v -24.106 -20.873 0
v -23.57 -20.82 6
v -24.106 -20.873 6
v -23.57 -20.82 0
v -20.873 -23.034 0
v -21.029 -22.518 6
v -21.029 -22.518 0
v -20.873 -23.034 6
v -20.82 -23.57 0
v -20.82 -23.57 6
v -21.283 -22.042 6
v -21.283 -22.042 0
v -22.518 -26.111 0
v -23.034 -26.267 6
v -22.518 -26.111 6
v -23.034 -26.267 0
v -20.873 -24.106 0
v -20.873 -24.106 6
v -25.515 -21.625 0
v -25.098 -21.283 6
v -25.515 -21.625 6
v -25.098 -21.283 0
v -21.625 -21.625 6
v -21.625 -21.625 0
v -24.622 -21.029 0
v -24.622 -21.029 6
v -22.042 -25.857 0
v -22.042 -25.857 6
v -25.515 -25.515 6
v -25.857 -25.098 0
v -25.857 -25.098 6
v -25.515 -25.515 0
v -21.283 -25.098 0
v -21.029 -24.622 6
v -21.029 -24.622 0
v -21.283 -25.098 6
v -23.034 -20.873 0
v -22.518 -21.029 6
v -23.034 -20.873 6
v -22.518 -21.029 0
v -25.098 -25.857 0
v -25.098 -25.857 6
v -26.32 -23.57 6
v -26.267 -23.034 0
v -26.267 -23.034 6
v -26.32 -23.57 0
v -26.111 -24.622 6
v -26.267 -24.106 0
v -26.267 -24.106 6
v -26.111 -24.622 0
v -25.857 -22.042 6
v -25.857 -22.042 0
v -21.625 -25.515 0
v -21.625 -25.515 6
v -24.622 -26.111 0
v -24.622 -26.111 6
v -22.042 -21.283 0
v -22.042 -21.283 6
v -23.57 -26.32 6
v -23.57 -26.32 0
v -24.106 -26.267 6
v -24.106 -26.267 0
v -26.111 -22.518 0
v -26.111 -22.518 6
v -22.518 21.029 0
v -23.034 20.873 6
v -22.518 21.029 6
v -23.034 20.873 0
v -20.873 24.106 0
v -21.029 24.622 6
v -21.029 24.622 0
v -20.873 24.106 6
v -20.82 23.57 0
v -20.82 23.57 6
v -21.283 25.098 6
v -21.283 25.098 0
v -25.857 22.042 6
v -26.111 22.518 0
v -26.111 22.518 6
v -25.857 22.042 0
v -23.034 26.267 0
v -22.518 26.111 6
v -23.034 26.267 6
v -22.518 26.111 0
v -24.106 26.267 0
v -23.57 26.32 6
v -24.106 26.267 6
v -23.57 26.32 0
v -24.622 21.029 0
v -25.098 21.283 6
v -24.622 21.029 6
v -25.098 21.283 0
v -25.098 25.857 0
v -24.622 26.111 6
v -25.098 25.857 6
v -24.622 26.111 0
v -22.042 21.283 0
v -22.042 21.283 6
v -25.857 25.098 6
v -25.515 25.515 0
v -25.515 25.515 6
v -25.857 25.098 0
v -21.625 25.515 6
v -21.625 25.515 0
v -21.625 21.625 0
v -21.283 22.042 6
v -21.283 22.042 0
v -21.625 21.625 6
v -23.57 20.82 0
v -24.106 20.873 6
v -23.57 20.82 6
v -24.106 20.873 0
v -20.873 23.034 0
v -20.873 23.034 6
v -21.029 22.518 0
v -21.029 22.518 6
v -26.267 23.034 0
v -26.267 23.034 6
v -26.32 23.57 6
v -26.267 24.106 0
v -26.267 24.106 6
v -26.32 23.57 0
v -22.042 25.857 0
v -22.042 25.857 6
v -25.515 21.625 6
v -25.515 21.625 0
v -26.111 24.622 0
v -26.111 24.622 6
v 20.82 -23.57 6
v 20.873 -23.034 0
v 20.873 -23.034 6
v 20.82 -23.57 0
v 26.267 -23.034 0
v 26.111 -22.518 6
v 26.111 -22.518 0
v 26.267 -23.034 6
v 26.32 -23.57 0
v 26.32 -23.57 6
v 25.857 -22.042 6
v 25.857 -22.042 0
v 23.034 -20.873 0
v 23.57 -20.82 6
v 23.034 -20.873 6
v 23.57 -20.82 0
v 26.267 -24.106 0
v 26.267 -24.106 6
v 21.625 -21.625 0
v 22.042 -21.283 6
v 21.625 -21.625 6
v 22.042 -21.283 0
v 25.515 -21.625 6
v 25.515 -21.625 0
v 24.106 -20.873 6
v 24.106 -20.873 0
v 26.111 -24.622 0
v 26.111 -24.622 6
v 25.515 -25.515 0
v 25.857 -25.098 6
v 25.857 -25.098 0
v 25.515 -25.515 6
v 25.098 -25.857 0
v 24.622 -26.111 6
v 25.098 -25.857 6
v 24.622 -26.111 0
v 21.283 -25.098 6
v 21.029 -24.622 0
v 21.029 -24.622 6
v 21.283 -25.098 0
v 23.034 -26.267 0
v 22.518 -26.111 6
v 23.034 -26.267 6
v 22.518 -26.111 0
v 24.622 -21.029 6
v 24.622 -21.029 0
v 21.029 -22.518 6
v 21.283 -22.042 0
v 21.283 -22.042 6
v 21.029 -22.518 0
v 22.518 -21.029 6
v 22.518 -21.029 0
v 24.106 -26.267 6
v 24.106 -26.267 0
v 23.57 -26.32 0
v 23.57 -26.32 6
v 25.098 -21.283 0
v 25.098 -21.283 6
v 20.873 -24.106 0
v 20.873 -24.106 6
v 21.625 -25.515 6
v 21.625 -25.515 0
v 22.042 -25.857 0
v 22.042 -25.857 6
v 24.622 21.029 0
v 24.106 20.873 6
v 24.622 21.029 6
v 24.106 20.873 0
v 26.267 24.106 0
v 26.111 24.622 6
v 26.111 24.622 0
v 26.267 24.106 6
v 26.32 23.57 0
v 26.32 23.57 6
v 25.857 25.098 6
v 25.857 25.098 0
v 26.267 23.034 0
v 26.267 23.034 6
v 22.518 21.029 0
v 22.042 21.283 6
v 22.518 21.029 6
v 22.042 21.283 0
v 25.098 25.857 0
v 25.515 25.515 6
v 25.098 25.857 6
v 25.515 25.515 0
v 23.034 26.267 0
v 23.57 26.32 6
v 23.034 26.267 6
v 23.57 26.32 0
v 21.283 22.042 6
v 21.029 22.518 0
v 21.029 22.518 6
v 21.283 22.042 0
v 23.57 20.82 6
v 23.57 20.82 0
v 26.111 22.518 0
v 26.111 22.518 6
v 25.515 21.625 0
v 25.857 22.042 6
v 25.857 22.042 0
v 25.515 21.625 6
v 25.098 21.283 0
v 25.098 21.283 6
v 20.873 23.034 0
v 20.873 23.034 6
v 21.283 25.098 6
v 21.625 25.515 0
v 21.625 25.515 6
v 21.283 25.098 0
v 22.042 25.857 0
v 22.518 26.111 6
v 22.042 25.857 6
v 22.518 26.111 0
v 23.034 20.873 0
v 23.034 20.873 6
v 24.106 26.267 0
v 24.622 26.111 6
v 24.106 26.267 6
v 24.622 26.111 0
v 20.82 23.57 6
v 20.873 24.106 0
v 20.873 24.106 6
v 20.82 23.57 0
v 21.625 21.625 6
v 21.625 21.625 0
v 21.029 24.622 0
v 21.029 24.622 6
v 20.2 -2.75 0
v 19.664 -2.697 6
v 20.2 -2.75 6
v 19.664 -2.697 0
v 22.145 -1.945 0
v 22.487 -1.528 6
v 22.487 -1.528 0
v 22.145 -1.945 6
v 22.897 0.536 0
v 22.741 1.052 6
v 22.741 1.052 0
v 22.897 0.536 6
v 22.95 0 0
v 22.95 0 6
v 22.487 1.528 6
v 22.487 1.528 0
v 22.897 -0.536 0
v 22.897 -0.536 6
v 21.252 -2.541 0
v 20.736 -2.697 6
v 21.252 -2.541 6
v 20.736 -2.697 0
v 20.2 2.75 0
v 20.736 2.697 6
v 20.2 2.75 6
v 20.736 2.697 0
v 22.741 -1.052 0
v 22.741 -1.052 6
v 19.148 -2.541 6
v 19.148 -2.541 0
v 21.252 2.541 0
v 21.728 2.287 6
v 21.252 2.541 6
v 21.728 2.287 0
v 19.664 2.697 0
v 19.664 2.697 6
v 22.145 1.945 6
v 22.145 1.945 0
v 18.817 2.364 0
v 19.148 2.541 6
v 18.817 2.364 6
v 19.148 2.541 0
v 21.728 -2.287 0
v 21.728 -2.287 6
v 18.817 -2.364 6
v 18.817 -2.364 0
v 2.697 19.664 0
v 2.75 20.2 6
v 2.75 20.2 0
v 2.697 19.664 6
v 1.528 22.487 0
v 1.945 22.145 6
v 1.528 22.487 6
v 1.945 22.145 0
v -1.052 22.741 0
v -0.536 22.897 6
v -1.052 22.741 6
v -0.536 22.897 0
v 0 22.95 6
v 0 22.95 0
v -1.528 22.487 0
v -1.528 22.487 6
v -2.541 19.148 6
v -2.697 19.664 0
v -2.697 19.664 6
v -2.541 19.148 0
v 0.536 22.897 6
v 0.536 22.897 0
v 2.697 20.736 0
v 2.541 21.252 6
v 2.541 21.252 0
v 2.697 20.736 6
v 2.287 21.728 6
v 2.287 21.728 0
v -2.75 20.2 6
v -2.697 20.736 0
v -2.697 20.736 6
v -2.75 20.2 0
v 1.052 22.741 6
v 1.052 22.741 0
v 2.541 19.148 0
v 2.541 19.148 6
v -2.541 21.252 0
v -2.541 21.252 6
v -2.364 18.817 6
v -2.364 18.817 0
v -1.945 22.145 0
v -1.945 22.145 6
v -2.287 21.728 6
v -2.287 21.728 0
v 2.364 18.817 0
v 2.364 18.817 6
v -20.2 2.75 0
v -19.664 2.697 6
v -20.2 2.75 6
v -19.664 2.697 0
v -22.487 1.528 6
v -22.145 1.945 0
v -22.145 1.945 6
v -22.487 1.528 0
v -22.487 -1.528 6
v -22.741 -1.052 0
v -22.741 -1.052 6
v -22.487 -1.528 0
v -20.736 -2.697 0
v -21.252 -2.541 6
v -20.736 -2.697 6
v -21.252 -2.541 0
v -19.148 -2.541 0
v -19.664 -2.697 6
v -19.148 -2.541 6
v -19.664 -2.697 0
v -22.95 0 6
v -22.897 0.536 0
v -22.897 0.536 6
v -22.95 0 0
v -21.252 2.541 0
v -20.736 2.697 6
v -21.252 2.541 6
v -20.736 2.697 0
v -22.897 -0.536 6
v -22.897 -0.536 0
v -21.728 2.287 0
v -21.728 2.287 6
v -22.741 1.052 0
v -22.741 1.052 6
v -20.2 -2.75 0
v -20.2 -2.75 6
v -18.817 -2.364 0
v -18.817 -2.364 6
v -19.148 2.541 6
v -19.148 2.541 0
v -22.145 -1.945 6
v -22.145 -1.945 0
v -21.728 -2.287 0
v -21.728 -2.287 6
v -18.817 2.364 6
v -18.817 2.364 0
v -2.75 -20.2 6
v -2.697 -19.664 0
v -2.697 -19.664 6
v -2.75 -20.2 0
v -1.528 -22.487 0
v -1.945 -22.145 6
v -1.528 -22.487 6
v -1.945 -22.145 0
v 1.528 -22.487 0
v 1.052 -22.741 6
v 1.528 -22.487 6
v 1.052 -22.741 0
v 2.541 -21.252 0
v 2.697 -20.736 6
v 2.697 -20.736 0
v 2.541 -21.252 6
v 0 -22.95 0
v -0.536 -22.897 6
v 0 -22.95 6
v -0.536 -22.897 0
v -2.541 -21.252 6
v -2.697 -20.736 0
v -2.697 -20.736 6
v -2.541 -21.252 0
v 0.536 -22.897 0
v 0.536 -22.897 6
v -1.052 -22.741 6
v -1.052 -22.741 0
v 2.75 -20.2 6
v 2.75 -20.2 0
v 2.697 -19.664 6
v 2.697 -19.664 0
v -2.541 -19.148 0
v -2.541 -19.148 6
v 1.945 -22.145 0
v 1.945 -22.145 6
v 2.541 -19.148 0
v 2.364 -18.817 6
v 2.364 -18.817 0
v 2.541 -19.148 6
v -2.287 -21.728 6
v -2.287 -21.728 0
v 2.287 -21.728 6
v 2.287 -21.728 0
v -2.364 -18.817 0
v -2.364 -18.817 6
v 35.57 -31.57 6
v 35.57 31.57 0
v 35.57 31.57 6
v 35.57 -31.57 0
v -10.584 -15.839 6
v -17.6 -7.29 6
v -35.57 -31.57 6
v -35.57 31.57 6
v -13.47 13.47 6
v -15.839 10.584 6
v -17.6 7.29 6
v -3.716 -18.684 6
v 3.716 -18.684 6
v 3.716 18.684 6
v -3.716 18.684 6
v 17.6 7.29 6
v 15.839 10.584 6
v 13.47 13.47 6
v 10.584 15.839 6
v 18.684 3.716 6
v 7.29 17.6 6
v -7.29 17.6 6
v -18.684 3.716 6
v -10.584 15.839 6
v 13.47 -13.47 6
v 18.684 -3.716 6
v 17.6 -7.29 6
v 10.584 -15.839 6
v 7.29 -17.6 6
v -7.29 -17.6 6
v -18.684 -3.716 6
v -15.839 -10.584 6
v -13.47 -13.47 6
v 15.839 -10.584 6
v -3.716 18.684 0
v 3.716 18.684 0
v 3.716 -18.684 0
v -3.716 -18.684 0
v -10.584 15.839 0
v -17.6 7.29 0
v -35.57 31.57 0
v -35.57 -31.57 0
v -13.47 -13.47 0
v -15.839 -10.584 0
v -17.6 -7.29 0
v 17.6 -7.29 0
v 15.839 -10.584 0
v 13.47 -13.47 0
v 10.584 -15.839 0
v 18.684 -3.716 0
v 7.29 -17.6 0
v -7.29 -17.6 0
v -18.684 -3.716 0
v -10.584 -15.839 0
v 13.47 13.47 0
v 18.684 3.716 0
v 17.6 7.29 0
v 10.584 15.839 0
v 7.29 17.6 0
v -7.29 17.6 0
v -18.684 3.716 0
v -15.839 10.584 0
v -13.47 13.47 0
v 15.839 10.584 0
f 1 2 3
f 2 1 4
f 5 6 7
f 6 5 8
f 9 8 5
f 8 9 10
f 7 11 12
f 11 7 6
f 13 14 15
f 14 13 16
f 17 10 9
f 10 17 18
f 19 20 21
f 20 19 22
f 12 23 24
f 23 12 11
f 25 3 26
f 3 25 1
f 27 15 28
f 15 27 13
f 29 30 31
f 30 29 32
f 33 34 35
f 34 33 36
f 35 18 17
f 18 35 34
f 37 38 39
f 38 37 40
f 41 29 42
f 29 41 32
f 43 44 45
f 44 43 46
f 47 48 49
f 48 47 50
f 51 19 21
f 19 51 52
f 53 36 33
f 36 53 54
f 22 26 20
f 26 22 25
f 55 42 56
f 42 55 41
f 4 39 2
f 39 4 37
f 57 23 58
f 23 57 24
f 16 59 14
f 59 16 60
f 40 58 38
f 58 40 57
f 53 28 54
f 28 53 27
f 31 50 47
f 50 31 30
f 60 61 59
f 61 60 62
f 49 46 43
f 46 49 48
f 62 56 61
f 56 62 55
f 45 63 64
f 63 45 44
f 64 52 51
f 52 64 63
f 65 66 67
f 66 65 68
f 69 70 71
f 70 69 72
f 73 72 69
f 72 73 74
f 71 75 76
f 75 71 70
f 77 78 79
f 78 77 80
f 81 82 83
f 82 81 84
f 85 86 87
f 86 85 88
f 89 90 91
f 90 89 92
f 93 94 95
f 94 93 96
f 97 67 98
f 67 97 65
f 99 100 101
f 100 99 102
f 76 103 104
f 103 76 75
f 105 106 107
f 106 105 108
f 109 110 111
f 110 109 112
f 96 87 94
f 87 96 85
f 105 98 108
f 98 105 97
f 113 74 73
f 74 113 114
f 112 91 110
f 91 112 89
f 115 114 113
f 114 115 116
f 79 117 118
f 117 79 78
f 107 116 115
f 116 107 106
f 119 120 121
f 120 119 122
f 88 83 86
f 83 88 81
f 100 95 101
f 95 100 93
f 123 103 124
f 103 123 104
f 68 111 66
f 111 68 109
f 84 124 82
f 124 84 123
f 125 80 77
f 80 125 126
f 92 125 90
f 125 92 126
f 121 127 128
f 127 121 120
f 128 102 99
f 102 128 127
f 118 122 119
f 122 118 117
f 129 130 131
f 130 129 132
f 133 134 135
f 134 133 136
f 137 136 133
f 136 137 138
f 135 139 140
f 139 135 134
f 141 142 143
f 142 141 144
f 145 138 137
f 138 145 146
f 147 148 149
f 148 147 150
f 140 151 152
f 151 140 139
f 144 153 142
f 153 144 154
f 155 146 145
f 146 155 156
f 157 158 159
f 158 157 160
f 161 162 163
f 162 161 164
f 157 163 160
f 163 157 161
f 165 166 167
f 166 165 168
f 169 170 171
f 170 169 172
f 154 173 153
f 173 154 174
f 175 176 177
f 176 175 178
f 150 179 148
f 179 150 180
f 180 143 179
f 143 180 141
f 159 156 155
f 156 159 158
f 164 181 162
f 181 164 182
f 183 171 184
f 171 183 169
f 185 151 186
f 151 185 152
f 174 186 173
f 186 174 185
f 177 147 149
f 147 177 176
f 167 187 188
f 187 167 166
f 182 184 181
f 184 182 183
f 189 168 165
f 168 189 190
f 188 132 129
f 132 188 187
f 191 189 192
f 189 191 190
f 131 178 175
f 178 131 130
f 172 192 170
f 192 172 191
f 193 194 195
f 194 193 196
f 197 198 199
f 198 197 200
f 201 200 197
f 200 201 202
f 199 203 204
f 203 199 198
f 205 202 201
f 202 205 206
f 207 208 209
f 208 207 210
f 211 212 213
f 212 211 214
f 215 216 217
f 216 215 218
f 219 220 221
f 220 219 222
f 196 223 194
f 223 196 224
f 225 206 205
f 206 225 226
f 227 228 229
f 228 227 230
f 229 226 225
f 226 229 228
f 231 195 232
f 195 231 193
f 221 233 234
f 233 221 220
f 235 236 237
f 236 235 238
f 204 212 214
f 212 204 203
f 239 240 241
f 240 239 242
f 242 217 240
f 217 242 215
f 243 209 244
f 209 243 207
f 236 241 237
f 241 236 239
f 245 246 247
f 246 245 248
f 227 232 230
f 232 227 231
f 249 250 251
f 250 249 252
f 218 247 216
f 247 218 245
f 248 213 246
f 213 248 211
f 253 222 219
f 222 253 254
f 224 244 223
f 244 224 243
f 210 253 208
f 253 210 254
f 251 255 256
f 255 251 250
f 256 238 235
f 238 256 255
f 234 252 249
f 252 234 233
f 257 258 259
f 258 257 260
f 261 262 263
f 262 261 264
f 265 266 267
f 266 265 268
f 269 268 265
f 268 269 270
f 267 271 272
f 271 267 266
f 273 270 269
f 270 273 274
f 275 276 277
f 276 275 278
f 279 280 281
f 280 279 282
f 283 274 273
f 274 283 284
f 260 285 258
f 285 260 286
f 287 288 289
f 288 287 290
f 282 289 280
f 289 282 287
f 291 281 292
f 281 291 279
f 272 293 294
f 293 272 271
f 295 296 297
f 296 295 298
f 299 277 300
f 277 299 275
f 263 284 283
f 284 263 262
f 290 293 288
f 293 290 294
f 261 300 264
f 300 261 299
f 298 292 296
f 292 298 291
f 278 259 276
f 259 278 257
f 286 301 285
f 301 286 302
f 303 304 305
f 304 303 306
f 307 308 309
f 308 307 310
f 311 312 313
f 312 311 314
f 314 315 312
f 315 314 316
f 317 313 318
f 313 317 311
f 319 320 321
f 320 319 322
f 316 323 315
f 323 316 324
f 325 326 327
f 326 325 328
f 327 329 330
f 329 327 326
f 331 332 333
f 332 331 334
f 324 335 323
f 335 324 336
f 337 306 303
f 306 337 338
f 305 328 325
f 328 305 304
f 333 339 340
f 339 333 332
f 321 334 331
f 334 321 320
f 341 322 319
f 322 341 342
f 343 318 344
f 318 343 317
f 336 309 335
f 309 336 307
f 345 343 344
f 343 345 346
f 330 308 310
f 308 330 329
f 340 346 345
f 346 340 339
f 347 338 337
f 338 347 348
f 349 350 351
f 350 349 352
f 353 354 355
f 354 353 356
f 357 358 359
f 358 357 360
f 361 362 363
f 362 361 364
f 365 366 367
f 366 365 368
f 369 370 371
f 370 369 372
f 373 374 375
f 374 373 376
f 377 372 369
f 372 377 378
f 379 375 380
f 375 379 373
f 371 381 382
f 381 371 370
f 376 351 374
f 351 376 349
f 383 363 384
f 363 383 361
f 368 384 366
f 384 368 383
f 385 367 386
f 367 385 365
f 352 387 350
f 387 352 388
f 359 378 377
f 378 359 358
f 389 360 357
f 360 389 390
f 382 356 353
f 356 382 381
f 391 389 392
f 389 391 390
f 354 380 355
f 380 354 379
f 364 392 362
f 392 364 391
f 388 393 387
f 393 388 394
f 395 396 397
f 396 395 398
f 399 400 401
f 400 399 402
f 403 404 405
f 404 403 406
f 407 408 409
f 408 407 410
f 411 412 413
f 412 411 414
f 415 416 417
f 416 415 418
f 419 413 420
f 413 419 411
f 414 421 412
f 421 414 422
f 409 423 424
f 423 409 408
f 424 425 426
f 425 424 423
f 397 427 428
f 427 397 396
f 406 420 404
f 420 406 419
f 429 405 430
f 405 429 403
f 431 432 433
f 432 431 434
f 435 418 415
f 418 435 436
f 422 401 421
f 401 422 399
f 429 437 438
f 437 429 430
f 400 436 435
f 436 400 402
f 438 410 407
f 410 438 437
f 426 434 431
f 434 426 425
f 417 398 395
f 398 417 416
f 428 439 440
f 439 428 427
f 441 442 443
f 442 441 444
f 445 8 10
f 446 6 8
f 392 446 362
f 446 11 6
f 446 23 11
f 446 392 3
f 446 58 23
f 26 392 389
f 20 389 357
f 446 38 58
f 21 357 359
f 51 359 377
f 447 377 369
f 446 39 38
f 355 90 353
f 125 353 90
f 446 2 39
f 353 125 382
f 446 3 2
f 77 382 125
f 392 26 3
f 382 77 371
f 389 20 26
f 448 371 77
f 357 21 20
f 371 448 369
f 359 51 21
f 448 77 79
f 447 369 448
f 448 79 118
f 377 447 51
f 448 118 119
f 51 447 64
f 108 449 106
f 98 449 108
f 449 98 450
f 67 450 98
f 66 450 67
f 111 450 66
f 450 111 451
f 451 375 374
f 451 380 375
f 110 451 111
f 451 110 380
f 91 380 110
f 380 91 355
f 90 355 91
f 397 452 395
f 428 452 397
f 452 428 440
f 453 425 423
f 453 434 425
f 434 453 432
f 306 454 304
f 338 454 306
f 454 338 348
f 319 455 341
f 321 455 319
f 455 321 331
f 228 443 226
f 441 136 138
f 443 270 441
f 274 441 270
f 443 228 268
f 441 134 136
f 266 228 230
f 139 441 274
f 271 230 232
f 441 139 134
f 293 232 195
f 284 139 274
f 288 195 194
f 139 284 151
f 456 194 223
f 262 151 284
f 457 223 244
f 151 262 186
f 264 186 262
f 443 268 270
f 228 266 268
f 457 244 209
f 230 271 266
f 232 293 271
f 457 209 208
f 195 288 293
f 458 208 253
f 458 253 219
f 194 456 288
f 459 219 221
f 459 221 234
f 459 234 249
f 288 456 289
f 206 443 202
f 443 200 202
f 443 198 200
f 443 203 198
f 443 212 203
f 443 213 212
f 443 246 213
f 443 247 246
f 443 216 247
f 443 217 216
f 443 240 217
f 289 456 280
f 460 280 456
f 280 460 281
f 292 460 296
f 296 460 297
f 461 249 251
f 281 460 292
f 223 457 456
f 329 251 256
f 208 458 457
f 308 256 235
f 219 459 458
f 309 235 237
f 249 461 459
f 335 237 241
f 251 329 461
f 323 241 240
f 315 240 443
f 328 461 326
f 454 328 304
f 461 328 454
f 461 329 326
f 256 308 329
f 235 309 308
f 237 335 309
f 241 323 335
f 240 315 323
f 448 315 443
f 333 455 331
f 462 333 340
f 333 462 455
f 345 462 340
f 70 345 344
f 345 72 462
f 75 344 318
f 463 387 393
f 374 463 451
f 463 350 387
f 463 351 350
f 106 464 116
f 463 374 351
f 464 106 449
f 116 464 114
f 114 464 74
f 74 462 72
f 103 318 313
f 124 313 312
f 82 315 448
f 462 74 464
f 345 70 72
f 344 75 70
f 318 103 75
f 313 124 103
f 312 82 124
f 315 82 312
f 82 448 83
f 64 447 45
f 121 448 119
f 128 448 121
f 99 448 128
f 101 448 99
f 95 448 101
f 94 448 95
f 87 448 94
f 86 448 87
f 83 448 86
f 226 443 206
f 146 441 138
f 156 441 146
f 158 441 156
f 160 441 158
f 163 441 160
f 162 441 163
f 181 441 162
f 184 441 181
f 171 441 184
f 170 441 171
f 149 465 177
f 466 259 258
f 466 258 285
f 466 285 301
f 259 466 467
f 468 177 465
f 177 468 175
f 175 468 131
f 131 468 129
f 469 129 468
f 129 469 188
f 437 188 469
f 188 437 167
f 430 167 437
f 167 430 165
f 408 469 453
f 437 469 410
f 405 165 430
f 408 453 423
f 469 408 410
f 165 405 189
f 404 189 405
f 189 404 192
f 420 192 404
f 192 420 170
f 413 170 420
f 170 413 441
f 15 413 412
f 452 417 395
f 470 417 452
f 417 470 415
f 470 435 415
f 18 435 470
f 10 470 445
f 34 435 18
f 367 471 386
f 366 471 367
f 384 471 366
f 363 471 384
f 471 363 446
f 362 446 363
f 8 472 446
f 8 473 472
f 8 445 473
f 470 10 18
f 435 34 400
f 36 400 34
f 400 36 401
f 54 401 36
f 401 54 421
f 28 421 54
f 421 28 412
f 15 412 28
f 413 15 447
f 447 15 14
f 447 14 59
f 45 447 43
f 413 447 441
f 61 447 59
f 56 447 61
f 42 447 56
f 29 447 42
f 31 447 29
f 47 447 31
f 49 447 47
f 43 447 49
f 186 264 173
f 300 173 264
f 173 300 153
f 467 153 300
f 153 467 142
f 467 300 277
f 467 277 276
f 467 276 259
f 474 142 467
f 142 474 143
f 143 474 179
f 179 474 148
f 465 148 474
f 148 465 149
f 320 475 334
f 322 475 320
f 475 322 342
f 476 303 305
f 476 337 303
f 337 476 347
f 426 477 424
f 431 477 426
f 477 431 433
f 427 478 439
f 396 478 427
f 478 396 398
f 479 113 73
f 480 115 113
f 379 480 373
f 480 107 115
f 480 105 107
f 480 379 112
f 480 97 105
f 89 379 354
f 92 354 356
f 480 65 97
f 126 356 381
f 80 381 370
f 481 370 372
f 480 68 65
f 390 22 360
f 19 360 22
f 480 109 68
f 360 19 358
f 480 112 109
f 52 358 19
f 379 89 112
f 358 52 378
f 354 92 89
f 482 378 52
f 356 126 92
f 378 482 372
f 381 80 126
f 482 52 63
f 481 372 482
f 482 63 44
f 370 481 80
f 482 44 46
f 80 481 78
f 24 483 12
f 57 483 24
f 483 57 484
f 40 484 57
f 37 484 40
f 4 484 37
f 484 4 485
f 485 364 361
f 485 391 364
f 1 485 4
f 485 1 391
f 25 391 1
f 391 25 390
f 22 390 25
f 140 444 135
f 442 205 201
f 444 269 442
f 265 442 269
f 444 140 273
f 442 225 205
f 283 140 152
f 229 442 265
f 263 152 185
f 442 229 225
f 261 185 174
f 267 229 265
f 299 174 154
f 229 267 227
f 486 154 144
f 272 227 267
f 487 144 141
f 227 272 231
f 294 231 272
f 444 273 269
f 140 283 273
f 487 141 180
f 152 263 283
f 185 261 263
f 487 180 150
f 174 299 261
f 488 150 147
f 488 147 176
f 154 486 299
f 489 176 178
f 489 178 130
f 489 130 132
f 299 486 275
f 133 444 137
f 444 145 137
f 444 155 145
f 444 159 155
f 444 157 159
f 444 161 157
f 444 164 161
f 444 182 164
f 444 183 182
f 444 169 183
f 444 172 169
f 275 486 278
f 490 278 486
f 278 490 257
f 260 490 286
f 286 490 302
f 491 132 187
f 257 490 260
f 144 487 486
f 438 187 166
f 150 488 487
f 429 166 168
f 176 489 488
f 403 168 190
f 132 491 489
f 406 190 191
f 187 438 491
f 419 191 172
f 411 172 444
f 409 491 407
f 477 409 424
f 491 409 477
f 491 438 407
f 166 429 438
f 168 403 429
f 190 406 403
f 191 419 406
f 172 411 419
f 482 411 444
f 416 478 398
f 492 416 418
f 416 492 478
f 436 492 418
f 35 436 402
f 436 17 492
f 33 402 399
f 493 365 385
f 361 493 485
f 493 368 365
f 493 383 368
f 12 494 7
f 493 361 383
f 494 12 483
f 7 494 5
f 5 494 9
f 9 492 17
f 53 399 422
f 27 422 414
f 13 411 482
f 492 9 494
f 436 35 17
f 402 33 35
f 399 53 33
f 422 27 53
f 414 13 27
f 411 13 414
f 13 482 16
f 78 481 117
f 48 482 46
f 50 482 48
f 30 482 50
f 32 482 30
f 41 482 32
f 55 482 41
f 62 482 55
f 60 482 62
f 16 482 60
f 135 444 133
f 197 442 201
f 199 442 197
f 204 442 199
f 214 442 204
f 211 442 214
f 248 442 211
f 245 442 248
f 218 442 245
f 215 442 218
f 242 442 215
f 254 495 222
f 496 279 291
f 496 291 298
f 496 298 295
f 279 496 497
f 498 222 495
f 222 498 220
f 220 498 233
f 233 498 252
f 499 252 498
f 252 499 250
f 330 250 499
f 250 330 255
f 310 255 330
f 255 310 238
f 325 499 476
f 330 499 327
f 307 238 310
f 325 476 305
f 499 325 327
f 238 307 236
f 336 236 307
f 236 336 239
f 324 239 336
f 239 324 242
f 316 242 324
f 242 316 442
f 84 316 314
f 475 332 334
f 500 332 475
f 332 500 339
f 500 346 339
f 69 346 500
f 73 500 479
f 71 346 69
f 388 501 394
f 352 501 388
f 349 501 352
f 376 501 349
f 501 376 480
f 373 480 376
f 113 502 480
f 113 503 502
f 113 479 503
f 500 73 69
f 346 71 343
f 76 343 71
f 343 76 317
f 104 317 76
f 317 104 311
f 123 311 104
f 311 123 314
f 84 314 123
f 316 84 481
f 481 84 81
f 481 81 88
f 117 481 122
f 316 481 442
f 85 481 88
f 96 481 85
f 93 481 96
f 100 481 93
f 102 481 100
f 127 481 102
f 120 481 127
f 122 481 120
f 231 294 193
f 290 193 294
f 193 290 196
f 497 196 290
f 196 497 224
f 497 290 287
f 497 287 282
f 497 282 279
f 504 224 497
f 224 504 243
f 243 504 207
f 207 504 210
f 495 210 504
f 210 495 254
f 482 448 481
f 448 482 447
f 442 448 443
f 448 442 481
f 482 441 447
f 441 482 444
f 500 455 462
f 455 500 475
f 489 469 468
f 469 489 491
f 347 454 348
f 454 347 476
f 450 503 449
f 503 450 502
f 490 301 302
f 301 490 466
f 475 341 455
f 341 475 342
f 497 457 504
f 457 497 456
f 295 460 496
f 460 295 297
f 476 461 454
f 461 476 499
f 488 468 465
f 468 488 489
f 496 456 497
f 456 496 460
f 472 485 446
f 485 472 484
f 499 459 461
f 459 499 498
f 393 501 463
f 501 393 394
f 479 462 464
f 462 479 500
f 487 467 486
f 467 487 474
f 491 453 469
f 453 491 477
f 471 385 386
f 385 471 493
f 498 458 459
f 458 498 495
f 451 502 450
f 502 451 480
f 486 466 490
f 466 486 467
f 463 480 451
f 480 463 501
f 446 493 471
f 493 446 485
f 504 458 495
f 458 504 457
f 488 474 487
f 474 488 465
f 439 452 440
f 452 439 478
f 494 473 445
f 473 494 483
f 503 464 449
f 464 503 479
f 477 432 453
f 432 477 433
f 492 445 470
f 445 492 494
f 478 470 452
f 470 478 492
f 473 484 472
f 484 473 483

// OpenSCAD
$fn = 32;

// ----------------------------------------------------------------------
// Motor mount plate: NEMA23, 71.14 x 63.14 x 6 mm
// ----------------------------------------------------------------------

// --- parameters (mm) ---
base_x = 71.14;           // plate length, X
base_y = 63.14;           // plate width, Y
thick = 6;                // plate thickness
bolt_pitch = 47.14;       // NEMA23 bolt spacing
motor_d = 5.5;            // NEMA23 screw clearance
boss_hole = 38.1;         // pilot boss bore
second_d = 5.5;           // second fastener hole
bc_r = 20.2;              // second bolt circle radius
bc_n = 4;                 // second bolt circle count

module plate() {
  translate([-base_x / 2, -base_y / 2, 0]) cube([base_x, base_y, thick]);
}

module motor_holes() {
  for (sx = [-1, 1]) for (sy = [-1, 1])
    translate([sx * bolt_pitch / 2, sy * bolt_pitch / 2, -1])
      cylinder(h = thick + 2, d = motor_d);
}

difference() {
  union() {
    plate();
  }
  motor_holes();
  translate([0, 0, -1]) cylinder(h = thick + 2, d = boss_hole);
  for (i = [0 : bc_n - 1]) rotate([0, 0, i * 360 / bc_n]) translate([bc_r, 0, -1])    cylinder(h = thick + 2, d = second_d);
}
